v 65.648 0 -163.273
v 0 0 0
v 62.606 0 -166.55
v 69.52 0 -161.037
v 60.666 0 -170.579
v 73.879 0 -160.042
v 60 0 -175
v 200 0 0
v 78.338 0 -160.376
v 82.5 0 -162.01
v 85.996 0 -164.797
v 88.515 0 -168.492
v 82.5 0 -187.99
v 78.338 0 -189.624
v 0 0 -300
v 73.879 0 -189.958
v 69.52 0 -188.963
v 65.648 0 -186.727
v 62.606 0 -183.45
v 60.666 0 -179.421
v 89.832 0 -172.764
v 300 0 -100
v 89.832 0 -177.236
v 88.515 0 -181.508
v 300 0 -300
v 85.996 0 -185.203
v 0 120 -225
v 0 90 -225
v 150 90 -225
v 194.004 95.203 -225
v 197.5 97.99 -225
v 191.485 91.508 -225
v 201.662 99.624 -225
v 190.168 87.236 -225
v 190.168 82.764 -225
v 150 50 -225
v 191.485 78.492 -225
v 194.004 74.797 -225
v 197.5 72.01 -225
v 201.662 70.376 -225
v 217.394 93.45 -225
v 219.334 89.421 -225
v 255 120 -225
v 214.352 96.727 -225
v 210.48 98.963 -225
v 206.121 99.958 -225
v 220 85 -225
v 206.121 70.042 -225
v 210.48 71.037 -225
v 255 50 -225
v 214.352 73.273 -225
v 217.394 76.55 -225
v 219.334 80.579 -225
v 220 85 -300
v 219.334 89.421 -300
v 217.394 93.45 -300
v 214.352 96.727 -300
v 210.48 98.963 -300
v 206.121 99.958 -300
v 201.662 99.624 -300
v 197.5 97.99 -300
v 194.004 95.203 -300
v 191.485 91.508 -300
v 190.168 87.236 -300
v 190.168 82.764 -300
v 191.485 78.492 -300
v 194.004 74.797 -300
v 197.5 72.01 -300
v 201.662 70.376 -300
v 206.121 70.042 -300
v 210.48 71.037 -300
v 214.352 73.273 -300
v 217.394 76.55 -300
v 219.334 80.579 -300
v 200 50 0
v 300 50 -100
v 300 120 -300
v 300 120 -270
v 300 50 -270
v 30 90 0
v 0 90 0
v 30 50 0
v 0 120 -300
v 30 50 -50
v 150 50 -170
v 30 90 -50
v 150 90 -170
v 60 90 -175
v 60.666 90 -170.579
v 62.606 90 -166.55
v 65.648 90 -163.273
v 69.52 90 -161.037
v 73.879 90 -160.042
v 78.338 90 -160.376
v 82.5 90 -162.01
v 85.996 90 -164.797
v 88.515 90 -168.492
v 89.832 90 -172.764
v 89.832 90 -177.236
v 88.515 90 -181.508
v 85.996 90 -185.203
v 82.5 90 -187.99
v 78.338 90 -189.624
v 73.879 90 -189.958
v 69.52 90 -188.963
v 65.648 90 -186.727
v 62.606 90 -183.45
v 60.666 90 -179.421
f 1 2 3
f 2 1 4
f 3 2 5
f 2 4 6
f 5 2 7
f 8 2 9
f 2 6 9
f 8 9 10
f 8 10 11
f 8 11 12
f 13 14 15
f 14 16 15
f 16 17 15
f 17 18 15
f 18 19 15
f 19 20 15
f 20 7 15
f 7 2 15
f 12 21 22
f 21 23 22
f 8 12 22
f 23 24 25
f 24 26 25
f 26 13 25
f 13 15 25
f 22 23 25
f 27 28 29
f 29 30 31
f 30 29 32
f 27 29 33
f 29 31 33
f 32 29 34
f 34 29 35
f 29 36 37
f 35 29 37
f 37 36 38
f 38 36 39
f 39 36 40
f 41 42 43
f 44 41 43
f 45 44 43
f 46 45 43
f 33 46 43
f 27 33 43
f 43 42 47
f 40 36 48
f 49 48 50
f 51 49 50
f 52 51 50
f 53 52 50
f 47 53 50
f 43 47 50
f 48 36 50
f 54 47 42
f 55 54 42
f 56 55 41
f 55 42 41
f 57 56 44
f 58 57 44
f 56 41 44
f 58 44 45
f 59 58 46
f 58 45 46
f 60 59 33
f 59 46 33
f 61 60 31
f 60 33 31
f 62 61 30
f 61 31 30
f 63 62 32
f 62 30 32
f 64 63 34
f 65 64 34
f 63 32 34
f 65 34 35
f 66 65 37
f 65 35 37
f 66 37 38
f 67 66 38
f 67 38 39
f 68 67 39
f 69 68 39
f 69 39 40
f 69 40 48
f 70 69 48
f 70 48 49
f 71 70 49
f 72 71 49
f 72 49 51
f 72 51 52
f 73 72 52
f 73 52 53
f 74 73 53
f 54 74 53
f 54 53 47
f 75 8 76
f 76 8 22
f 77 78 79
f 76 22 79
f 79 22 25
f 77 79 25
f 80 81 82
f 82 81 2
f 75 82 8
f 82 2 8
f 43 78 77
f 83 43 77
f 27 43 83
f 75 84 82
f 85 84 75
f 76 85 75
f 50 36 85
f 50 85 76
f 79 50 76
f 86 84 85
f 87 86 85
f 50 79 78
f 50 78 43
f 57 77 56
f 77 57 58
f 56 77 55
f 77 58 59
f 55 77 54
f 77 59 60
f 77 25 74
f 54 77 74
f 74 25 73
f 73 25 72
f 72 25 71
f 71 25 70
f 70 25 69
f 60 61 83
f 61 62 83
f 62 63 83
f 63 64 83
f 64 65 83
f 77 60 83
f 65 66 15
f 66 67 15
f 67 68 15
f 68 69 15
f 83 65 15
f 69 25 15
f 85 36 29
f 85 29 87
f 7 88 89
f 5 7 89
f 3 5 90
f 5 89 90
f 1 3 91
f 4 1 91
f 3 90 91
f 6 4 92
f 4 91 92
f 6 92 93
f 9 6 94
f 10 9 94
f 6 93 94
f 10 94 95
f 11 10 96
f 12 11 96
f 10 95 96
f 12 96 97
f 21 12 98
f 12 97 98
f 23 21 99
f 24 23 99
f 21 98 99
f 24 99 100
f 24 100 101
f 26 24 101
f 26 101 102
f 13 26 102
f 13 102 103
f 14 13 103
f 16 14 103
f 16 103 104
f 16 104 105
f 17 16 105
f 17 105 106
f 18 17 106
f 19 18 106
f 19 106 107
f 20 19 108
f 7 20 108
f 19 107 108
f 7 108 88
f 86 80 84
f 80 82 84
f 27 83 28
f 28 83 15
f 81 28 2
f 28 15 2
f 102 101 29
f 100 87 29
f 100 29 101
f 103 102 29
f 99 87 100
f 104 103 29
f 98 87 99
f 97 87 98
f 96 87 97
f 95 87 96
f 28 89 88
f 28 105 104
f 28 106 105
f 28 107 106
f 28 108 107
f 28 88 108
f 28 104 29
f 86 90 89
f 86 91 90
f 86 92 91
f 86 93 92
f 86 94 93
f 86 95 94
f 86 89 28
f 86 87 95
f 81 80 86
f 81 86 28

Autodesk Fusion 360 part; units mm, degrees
sketch "Sketch1" plane through (0, 0, 0) normal (0, 1, 0) x (1, 0, 0)
  line L0 (0, 0) -> (300, 0)
  line L1 (300, 0) -> (300, 300)
  line L2 (300, 300) -> (0, 300)
  line L3 (0, 300) -> (0, 0)
  line L4 (0, 0) -> (200, 0)
  line L5 (300, 300) -> (300, 100)
  line L6 (200, 0) -> (300, 100)
  dimension "d1" = 300
  dimension "d2" = 300
  dimension "d3" = 200
  dimension "d4" = 200
extrude "Extrude1" add sketch "Sketch1" along normal blind 50 contours L0 L1 L2 L3 L4 L5 L6
sketch "Sketch2" plane through (0, 50, 0) normal (0, 1, 0) x (-1, 0, 0)
  line L0 (-300, -300) -> (0, -300)
  line L1 (0, -300) -> (0, 0)
  line L2 (0, 0) -> (-200, 0)
  line L3 (-200, 0) -> (-300, -100)
  line L4 (-300, -100) -> (-300, -300)
  line L5 (0, 0) -> (-30, 0)
  line L6 (-300, -300) -> (-300, -270)
  line L7 (0, -300) -> (0, -270)
  line L8 (0, -300) -> (0, -240)
  line L9 (-300, -270) -> (-255, -225)
  line L10 (0, -300) -> (0, -225)
  line L11 (0, -225) -> (-255, -225)
  line L12 (-30, 0) -> (-30, -50)
  line L13 (-30, -50) -> (-145.4741, -165.4741)
  line L14 (-30, -50) -> (133.305, -50) construction
  line L15 (0, -225) -> (-150, -225)
  line L16 (-150, -225) -> (-150, -170)
  line L17 (-30, -50) -> (-150, -170)
  line L18 (-30, -50) -> (157.6281, -50) construction
  dimension "d7" = 30
  dimension "d8" = 30
  dimension "d9" = 60
  dimension "d11" = 75
  dimension "d12" = 50
  dimension "d13" = 135
  dimension "d14" = 150
  dimension "d15" = 135
extrude "Extrude2" add sketch "Sketch2" along normal blind 40 contours L1 L2 L5 L11 L12 L13 L15 L16 L17
extrude "Extrude3" add sketch "Sketch2" along normal blind 70 contours L0 L1 L4 L6 L7 L8 L9 L10 L11 L15
sketch "Sketch4" plane through (0, 90, 0) normal (0, 1, 0) x (-1, 0, 0)
  line L0 (0, -225) -> (0, 0)
  line L1 (0, 0) -> (-30, 0)
  line L2 (-30, 0) -> (-30, -50)
  line L3 (-30, -50) -> (-150, -170)
  line L4 (-150, -170) -> (-150, -225)
  line L5 (-150, -225) -> (0, -225)
  circle A0 centre (-75, -175) radius 15
  dimension "d20" = 30
  dimension "d21" = 50
  dimension "d22" = 75
extrude "Extrude4" cut sketch "Sketch4" against normal blind 250 contours A0
sketch "Sketch5" plane through (0, 0, -225) normal (0, 0, 1) x (1, 0, 0)
  line L0 (0, 90) -> (150, 90)
  line L1 (150, 90) -> (150, 50)
  line L2 (150, 50) -> (255, 50)
  line L3 (255, 50) -> (255, 120)
  line L4 (255, 120) -> (0, 120)
  line L5 (0, 120) -> (0, 90)
  circle A0 centre (205, 85) radius 15
  dimension "d25" = 30
  dimension "d26" = 35
  dimension "d27" = 55
extrude "Extrude5" cut sketch "Sketch5" against normal blind 410 contours A0
